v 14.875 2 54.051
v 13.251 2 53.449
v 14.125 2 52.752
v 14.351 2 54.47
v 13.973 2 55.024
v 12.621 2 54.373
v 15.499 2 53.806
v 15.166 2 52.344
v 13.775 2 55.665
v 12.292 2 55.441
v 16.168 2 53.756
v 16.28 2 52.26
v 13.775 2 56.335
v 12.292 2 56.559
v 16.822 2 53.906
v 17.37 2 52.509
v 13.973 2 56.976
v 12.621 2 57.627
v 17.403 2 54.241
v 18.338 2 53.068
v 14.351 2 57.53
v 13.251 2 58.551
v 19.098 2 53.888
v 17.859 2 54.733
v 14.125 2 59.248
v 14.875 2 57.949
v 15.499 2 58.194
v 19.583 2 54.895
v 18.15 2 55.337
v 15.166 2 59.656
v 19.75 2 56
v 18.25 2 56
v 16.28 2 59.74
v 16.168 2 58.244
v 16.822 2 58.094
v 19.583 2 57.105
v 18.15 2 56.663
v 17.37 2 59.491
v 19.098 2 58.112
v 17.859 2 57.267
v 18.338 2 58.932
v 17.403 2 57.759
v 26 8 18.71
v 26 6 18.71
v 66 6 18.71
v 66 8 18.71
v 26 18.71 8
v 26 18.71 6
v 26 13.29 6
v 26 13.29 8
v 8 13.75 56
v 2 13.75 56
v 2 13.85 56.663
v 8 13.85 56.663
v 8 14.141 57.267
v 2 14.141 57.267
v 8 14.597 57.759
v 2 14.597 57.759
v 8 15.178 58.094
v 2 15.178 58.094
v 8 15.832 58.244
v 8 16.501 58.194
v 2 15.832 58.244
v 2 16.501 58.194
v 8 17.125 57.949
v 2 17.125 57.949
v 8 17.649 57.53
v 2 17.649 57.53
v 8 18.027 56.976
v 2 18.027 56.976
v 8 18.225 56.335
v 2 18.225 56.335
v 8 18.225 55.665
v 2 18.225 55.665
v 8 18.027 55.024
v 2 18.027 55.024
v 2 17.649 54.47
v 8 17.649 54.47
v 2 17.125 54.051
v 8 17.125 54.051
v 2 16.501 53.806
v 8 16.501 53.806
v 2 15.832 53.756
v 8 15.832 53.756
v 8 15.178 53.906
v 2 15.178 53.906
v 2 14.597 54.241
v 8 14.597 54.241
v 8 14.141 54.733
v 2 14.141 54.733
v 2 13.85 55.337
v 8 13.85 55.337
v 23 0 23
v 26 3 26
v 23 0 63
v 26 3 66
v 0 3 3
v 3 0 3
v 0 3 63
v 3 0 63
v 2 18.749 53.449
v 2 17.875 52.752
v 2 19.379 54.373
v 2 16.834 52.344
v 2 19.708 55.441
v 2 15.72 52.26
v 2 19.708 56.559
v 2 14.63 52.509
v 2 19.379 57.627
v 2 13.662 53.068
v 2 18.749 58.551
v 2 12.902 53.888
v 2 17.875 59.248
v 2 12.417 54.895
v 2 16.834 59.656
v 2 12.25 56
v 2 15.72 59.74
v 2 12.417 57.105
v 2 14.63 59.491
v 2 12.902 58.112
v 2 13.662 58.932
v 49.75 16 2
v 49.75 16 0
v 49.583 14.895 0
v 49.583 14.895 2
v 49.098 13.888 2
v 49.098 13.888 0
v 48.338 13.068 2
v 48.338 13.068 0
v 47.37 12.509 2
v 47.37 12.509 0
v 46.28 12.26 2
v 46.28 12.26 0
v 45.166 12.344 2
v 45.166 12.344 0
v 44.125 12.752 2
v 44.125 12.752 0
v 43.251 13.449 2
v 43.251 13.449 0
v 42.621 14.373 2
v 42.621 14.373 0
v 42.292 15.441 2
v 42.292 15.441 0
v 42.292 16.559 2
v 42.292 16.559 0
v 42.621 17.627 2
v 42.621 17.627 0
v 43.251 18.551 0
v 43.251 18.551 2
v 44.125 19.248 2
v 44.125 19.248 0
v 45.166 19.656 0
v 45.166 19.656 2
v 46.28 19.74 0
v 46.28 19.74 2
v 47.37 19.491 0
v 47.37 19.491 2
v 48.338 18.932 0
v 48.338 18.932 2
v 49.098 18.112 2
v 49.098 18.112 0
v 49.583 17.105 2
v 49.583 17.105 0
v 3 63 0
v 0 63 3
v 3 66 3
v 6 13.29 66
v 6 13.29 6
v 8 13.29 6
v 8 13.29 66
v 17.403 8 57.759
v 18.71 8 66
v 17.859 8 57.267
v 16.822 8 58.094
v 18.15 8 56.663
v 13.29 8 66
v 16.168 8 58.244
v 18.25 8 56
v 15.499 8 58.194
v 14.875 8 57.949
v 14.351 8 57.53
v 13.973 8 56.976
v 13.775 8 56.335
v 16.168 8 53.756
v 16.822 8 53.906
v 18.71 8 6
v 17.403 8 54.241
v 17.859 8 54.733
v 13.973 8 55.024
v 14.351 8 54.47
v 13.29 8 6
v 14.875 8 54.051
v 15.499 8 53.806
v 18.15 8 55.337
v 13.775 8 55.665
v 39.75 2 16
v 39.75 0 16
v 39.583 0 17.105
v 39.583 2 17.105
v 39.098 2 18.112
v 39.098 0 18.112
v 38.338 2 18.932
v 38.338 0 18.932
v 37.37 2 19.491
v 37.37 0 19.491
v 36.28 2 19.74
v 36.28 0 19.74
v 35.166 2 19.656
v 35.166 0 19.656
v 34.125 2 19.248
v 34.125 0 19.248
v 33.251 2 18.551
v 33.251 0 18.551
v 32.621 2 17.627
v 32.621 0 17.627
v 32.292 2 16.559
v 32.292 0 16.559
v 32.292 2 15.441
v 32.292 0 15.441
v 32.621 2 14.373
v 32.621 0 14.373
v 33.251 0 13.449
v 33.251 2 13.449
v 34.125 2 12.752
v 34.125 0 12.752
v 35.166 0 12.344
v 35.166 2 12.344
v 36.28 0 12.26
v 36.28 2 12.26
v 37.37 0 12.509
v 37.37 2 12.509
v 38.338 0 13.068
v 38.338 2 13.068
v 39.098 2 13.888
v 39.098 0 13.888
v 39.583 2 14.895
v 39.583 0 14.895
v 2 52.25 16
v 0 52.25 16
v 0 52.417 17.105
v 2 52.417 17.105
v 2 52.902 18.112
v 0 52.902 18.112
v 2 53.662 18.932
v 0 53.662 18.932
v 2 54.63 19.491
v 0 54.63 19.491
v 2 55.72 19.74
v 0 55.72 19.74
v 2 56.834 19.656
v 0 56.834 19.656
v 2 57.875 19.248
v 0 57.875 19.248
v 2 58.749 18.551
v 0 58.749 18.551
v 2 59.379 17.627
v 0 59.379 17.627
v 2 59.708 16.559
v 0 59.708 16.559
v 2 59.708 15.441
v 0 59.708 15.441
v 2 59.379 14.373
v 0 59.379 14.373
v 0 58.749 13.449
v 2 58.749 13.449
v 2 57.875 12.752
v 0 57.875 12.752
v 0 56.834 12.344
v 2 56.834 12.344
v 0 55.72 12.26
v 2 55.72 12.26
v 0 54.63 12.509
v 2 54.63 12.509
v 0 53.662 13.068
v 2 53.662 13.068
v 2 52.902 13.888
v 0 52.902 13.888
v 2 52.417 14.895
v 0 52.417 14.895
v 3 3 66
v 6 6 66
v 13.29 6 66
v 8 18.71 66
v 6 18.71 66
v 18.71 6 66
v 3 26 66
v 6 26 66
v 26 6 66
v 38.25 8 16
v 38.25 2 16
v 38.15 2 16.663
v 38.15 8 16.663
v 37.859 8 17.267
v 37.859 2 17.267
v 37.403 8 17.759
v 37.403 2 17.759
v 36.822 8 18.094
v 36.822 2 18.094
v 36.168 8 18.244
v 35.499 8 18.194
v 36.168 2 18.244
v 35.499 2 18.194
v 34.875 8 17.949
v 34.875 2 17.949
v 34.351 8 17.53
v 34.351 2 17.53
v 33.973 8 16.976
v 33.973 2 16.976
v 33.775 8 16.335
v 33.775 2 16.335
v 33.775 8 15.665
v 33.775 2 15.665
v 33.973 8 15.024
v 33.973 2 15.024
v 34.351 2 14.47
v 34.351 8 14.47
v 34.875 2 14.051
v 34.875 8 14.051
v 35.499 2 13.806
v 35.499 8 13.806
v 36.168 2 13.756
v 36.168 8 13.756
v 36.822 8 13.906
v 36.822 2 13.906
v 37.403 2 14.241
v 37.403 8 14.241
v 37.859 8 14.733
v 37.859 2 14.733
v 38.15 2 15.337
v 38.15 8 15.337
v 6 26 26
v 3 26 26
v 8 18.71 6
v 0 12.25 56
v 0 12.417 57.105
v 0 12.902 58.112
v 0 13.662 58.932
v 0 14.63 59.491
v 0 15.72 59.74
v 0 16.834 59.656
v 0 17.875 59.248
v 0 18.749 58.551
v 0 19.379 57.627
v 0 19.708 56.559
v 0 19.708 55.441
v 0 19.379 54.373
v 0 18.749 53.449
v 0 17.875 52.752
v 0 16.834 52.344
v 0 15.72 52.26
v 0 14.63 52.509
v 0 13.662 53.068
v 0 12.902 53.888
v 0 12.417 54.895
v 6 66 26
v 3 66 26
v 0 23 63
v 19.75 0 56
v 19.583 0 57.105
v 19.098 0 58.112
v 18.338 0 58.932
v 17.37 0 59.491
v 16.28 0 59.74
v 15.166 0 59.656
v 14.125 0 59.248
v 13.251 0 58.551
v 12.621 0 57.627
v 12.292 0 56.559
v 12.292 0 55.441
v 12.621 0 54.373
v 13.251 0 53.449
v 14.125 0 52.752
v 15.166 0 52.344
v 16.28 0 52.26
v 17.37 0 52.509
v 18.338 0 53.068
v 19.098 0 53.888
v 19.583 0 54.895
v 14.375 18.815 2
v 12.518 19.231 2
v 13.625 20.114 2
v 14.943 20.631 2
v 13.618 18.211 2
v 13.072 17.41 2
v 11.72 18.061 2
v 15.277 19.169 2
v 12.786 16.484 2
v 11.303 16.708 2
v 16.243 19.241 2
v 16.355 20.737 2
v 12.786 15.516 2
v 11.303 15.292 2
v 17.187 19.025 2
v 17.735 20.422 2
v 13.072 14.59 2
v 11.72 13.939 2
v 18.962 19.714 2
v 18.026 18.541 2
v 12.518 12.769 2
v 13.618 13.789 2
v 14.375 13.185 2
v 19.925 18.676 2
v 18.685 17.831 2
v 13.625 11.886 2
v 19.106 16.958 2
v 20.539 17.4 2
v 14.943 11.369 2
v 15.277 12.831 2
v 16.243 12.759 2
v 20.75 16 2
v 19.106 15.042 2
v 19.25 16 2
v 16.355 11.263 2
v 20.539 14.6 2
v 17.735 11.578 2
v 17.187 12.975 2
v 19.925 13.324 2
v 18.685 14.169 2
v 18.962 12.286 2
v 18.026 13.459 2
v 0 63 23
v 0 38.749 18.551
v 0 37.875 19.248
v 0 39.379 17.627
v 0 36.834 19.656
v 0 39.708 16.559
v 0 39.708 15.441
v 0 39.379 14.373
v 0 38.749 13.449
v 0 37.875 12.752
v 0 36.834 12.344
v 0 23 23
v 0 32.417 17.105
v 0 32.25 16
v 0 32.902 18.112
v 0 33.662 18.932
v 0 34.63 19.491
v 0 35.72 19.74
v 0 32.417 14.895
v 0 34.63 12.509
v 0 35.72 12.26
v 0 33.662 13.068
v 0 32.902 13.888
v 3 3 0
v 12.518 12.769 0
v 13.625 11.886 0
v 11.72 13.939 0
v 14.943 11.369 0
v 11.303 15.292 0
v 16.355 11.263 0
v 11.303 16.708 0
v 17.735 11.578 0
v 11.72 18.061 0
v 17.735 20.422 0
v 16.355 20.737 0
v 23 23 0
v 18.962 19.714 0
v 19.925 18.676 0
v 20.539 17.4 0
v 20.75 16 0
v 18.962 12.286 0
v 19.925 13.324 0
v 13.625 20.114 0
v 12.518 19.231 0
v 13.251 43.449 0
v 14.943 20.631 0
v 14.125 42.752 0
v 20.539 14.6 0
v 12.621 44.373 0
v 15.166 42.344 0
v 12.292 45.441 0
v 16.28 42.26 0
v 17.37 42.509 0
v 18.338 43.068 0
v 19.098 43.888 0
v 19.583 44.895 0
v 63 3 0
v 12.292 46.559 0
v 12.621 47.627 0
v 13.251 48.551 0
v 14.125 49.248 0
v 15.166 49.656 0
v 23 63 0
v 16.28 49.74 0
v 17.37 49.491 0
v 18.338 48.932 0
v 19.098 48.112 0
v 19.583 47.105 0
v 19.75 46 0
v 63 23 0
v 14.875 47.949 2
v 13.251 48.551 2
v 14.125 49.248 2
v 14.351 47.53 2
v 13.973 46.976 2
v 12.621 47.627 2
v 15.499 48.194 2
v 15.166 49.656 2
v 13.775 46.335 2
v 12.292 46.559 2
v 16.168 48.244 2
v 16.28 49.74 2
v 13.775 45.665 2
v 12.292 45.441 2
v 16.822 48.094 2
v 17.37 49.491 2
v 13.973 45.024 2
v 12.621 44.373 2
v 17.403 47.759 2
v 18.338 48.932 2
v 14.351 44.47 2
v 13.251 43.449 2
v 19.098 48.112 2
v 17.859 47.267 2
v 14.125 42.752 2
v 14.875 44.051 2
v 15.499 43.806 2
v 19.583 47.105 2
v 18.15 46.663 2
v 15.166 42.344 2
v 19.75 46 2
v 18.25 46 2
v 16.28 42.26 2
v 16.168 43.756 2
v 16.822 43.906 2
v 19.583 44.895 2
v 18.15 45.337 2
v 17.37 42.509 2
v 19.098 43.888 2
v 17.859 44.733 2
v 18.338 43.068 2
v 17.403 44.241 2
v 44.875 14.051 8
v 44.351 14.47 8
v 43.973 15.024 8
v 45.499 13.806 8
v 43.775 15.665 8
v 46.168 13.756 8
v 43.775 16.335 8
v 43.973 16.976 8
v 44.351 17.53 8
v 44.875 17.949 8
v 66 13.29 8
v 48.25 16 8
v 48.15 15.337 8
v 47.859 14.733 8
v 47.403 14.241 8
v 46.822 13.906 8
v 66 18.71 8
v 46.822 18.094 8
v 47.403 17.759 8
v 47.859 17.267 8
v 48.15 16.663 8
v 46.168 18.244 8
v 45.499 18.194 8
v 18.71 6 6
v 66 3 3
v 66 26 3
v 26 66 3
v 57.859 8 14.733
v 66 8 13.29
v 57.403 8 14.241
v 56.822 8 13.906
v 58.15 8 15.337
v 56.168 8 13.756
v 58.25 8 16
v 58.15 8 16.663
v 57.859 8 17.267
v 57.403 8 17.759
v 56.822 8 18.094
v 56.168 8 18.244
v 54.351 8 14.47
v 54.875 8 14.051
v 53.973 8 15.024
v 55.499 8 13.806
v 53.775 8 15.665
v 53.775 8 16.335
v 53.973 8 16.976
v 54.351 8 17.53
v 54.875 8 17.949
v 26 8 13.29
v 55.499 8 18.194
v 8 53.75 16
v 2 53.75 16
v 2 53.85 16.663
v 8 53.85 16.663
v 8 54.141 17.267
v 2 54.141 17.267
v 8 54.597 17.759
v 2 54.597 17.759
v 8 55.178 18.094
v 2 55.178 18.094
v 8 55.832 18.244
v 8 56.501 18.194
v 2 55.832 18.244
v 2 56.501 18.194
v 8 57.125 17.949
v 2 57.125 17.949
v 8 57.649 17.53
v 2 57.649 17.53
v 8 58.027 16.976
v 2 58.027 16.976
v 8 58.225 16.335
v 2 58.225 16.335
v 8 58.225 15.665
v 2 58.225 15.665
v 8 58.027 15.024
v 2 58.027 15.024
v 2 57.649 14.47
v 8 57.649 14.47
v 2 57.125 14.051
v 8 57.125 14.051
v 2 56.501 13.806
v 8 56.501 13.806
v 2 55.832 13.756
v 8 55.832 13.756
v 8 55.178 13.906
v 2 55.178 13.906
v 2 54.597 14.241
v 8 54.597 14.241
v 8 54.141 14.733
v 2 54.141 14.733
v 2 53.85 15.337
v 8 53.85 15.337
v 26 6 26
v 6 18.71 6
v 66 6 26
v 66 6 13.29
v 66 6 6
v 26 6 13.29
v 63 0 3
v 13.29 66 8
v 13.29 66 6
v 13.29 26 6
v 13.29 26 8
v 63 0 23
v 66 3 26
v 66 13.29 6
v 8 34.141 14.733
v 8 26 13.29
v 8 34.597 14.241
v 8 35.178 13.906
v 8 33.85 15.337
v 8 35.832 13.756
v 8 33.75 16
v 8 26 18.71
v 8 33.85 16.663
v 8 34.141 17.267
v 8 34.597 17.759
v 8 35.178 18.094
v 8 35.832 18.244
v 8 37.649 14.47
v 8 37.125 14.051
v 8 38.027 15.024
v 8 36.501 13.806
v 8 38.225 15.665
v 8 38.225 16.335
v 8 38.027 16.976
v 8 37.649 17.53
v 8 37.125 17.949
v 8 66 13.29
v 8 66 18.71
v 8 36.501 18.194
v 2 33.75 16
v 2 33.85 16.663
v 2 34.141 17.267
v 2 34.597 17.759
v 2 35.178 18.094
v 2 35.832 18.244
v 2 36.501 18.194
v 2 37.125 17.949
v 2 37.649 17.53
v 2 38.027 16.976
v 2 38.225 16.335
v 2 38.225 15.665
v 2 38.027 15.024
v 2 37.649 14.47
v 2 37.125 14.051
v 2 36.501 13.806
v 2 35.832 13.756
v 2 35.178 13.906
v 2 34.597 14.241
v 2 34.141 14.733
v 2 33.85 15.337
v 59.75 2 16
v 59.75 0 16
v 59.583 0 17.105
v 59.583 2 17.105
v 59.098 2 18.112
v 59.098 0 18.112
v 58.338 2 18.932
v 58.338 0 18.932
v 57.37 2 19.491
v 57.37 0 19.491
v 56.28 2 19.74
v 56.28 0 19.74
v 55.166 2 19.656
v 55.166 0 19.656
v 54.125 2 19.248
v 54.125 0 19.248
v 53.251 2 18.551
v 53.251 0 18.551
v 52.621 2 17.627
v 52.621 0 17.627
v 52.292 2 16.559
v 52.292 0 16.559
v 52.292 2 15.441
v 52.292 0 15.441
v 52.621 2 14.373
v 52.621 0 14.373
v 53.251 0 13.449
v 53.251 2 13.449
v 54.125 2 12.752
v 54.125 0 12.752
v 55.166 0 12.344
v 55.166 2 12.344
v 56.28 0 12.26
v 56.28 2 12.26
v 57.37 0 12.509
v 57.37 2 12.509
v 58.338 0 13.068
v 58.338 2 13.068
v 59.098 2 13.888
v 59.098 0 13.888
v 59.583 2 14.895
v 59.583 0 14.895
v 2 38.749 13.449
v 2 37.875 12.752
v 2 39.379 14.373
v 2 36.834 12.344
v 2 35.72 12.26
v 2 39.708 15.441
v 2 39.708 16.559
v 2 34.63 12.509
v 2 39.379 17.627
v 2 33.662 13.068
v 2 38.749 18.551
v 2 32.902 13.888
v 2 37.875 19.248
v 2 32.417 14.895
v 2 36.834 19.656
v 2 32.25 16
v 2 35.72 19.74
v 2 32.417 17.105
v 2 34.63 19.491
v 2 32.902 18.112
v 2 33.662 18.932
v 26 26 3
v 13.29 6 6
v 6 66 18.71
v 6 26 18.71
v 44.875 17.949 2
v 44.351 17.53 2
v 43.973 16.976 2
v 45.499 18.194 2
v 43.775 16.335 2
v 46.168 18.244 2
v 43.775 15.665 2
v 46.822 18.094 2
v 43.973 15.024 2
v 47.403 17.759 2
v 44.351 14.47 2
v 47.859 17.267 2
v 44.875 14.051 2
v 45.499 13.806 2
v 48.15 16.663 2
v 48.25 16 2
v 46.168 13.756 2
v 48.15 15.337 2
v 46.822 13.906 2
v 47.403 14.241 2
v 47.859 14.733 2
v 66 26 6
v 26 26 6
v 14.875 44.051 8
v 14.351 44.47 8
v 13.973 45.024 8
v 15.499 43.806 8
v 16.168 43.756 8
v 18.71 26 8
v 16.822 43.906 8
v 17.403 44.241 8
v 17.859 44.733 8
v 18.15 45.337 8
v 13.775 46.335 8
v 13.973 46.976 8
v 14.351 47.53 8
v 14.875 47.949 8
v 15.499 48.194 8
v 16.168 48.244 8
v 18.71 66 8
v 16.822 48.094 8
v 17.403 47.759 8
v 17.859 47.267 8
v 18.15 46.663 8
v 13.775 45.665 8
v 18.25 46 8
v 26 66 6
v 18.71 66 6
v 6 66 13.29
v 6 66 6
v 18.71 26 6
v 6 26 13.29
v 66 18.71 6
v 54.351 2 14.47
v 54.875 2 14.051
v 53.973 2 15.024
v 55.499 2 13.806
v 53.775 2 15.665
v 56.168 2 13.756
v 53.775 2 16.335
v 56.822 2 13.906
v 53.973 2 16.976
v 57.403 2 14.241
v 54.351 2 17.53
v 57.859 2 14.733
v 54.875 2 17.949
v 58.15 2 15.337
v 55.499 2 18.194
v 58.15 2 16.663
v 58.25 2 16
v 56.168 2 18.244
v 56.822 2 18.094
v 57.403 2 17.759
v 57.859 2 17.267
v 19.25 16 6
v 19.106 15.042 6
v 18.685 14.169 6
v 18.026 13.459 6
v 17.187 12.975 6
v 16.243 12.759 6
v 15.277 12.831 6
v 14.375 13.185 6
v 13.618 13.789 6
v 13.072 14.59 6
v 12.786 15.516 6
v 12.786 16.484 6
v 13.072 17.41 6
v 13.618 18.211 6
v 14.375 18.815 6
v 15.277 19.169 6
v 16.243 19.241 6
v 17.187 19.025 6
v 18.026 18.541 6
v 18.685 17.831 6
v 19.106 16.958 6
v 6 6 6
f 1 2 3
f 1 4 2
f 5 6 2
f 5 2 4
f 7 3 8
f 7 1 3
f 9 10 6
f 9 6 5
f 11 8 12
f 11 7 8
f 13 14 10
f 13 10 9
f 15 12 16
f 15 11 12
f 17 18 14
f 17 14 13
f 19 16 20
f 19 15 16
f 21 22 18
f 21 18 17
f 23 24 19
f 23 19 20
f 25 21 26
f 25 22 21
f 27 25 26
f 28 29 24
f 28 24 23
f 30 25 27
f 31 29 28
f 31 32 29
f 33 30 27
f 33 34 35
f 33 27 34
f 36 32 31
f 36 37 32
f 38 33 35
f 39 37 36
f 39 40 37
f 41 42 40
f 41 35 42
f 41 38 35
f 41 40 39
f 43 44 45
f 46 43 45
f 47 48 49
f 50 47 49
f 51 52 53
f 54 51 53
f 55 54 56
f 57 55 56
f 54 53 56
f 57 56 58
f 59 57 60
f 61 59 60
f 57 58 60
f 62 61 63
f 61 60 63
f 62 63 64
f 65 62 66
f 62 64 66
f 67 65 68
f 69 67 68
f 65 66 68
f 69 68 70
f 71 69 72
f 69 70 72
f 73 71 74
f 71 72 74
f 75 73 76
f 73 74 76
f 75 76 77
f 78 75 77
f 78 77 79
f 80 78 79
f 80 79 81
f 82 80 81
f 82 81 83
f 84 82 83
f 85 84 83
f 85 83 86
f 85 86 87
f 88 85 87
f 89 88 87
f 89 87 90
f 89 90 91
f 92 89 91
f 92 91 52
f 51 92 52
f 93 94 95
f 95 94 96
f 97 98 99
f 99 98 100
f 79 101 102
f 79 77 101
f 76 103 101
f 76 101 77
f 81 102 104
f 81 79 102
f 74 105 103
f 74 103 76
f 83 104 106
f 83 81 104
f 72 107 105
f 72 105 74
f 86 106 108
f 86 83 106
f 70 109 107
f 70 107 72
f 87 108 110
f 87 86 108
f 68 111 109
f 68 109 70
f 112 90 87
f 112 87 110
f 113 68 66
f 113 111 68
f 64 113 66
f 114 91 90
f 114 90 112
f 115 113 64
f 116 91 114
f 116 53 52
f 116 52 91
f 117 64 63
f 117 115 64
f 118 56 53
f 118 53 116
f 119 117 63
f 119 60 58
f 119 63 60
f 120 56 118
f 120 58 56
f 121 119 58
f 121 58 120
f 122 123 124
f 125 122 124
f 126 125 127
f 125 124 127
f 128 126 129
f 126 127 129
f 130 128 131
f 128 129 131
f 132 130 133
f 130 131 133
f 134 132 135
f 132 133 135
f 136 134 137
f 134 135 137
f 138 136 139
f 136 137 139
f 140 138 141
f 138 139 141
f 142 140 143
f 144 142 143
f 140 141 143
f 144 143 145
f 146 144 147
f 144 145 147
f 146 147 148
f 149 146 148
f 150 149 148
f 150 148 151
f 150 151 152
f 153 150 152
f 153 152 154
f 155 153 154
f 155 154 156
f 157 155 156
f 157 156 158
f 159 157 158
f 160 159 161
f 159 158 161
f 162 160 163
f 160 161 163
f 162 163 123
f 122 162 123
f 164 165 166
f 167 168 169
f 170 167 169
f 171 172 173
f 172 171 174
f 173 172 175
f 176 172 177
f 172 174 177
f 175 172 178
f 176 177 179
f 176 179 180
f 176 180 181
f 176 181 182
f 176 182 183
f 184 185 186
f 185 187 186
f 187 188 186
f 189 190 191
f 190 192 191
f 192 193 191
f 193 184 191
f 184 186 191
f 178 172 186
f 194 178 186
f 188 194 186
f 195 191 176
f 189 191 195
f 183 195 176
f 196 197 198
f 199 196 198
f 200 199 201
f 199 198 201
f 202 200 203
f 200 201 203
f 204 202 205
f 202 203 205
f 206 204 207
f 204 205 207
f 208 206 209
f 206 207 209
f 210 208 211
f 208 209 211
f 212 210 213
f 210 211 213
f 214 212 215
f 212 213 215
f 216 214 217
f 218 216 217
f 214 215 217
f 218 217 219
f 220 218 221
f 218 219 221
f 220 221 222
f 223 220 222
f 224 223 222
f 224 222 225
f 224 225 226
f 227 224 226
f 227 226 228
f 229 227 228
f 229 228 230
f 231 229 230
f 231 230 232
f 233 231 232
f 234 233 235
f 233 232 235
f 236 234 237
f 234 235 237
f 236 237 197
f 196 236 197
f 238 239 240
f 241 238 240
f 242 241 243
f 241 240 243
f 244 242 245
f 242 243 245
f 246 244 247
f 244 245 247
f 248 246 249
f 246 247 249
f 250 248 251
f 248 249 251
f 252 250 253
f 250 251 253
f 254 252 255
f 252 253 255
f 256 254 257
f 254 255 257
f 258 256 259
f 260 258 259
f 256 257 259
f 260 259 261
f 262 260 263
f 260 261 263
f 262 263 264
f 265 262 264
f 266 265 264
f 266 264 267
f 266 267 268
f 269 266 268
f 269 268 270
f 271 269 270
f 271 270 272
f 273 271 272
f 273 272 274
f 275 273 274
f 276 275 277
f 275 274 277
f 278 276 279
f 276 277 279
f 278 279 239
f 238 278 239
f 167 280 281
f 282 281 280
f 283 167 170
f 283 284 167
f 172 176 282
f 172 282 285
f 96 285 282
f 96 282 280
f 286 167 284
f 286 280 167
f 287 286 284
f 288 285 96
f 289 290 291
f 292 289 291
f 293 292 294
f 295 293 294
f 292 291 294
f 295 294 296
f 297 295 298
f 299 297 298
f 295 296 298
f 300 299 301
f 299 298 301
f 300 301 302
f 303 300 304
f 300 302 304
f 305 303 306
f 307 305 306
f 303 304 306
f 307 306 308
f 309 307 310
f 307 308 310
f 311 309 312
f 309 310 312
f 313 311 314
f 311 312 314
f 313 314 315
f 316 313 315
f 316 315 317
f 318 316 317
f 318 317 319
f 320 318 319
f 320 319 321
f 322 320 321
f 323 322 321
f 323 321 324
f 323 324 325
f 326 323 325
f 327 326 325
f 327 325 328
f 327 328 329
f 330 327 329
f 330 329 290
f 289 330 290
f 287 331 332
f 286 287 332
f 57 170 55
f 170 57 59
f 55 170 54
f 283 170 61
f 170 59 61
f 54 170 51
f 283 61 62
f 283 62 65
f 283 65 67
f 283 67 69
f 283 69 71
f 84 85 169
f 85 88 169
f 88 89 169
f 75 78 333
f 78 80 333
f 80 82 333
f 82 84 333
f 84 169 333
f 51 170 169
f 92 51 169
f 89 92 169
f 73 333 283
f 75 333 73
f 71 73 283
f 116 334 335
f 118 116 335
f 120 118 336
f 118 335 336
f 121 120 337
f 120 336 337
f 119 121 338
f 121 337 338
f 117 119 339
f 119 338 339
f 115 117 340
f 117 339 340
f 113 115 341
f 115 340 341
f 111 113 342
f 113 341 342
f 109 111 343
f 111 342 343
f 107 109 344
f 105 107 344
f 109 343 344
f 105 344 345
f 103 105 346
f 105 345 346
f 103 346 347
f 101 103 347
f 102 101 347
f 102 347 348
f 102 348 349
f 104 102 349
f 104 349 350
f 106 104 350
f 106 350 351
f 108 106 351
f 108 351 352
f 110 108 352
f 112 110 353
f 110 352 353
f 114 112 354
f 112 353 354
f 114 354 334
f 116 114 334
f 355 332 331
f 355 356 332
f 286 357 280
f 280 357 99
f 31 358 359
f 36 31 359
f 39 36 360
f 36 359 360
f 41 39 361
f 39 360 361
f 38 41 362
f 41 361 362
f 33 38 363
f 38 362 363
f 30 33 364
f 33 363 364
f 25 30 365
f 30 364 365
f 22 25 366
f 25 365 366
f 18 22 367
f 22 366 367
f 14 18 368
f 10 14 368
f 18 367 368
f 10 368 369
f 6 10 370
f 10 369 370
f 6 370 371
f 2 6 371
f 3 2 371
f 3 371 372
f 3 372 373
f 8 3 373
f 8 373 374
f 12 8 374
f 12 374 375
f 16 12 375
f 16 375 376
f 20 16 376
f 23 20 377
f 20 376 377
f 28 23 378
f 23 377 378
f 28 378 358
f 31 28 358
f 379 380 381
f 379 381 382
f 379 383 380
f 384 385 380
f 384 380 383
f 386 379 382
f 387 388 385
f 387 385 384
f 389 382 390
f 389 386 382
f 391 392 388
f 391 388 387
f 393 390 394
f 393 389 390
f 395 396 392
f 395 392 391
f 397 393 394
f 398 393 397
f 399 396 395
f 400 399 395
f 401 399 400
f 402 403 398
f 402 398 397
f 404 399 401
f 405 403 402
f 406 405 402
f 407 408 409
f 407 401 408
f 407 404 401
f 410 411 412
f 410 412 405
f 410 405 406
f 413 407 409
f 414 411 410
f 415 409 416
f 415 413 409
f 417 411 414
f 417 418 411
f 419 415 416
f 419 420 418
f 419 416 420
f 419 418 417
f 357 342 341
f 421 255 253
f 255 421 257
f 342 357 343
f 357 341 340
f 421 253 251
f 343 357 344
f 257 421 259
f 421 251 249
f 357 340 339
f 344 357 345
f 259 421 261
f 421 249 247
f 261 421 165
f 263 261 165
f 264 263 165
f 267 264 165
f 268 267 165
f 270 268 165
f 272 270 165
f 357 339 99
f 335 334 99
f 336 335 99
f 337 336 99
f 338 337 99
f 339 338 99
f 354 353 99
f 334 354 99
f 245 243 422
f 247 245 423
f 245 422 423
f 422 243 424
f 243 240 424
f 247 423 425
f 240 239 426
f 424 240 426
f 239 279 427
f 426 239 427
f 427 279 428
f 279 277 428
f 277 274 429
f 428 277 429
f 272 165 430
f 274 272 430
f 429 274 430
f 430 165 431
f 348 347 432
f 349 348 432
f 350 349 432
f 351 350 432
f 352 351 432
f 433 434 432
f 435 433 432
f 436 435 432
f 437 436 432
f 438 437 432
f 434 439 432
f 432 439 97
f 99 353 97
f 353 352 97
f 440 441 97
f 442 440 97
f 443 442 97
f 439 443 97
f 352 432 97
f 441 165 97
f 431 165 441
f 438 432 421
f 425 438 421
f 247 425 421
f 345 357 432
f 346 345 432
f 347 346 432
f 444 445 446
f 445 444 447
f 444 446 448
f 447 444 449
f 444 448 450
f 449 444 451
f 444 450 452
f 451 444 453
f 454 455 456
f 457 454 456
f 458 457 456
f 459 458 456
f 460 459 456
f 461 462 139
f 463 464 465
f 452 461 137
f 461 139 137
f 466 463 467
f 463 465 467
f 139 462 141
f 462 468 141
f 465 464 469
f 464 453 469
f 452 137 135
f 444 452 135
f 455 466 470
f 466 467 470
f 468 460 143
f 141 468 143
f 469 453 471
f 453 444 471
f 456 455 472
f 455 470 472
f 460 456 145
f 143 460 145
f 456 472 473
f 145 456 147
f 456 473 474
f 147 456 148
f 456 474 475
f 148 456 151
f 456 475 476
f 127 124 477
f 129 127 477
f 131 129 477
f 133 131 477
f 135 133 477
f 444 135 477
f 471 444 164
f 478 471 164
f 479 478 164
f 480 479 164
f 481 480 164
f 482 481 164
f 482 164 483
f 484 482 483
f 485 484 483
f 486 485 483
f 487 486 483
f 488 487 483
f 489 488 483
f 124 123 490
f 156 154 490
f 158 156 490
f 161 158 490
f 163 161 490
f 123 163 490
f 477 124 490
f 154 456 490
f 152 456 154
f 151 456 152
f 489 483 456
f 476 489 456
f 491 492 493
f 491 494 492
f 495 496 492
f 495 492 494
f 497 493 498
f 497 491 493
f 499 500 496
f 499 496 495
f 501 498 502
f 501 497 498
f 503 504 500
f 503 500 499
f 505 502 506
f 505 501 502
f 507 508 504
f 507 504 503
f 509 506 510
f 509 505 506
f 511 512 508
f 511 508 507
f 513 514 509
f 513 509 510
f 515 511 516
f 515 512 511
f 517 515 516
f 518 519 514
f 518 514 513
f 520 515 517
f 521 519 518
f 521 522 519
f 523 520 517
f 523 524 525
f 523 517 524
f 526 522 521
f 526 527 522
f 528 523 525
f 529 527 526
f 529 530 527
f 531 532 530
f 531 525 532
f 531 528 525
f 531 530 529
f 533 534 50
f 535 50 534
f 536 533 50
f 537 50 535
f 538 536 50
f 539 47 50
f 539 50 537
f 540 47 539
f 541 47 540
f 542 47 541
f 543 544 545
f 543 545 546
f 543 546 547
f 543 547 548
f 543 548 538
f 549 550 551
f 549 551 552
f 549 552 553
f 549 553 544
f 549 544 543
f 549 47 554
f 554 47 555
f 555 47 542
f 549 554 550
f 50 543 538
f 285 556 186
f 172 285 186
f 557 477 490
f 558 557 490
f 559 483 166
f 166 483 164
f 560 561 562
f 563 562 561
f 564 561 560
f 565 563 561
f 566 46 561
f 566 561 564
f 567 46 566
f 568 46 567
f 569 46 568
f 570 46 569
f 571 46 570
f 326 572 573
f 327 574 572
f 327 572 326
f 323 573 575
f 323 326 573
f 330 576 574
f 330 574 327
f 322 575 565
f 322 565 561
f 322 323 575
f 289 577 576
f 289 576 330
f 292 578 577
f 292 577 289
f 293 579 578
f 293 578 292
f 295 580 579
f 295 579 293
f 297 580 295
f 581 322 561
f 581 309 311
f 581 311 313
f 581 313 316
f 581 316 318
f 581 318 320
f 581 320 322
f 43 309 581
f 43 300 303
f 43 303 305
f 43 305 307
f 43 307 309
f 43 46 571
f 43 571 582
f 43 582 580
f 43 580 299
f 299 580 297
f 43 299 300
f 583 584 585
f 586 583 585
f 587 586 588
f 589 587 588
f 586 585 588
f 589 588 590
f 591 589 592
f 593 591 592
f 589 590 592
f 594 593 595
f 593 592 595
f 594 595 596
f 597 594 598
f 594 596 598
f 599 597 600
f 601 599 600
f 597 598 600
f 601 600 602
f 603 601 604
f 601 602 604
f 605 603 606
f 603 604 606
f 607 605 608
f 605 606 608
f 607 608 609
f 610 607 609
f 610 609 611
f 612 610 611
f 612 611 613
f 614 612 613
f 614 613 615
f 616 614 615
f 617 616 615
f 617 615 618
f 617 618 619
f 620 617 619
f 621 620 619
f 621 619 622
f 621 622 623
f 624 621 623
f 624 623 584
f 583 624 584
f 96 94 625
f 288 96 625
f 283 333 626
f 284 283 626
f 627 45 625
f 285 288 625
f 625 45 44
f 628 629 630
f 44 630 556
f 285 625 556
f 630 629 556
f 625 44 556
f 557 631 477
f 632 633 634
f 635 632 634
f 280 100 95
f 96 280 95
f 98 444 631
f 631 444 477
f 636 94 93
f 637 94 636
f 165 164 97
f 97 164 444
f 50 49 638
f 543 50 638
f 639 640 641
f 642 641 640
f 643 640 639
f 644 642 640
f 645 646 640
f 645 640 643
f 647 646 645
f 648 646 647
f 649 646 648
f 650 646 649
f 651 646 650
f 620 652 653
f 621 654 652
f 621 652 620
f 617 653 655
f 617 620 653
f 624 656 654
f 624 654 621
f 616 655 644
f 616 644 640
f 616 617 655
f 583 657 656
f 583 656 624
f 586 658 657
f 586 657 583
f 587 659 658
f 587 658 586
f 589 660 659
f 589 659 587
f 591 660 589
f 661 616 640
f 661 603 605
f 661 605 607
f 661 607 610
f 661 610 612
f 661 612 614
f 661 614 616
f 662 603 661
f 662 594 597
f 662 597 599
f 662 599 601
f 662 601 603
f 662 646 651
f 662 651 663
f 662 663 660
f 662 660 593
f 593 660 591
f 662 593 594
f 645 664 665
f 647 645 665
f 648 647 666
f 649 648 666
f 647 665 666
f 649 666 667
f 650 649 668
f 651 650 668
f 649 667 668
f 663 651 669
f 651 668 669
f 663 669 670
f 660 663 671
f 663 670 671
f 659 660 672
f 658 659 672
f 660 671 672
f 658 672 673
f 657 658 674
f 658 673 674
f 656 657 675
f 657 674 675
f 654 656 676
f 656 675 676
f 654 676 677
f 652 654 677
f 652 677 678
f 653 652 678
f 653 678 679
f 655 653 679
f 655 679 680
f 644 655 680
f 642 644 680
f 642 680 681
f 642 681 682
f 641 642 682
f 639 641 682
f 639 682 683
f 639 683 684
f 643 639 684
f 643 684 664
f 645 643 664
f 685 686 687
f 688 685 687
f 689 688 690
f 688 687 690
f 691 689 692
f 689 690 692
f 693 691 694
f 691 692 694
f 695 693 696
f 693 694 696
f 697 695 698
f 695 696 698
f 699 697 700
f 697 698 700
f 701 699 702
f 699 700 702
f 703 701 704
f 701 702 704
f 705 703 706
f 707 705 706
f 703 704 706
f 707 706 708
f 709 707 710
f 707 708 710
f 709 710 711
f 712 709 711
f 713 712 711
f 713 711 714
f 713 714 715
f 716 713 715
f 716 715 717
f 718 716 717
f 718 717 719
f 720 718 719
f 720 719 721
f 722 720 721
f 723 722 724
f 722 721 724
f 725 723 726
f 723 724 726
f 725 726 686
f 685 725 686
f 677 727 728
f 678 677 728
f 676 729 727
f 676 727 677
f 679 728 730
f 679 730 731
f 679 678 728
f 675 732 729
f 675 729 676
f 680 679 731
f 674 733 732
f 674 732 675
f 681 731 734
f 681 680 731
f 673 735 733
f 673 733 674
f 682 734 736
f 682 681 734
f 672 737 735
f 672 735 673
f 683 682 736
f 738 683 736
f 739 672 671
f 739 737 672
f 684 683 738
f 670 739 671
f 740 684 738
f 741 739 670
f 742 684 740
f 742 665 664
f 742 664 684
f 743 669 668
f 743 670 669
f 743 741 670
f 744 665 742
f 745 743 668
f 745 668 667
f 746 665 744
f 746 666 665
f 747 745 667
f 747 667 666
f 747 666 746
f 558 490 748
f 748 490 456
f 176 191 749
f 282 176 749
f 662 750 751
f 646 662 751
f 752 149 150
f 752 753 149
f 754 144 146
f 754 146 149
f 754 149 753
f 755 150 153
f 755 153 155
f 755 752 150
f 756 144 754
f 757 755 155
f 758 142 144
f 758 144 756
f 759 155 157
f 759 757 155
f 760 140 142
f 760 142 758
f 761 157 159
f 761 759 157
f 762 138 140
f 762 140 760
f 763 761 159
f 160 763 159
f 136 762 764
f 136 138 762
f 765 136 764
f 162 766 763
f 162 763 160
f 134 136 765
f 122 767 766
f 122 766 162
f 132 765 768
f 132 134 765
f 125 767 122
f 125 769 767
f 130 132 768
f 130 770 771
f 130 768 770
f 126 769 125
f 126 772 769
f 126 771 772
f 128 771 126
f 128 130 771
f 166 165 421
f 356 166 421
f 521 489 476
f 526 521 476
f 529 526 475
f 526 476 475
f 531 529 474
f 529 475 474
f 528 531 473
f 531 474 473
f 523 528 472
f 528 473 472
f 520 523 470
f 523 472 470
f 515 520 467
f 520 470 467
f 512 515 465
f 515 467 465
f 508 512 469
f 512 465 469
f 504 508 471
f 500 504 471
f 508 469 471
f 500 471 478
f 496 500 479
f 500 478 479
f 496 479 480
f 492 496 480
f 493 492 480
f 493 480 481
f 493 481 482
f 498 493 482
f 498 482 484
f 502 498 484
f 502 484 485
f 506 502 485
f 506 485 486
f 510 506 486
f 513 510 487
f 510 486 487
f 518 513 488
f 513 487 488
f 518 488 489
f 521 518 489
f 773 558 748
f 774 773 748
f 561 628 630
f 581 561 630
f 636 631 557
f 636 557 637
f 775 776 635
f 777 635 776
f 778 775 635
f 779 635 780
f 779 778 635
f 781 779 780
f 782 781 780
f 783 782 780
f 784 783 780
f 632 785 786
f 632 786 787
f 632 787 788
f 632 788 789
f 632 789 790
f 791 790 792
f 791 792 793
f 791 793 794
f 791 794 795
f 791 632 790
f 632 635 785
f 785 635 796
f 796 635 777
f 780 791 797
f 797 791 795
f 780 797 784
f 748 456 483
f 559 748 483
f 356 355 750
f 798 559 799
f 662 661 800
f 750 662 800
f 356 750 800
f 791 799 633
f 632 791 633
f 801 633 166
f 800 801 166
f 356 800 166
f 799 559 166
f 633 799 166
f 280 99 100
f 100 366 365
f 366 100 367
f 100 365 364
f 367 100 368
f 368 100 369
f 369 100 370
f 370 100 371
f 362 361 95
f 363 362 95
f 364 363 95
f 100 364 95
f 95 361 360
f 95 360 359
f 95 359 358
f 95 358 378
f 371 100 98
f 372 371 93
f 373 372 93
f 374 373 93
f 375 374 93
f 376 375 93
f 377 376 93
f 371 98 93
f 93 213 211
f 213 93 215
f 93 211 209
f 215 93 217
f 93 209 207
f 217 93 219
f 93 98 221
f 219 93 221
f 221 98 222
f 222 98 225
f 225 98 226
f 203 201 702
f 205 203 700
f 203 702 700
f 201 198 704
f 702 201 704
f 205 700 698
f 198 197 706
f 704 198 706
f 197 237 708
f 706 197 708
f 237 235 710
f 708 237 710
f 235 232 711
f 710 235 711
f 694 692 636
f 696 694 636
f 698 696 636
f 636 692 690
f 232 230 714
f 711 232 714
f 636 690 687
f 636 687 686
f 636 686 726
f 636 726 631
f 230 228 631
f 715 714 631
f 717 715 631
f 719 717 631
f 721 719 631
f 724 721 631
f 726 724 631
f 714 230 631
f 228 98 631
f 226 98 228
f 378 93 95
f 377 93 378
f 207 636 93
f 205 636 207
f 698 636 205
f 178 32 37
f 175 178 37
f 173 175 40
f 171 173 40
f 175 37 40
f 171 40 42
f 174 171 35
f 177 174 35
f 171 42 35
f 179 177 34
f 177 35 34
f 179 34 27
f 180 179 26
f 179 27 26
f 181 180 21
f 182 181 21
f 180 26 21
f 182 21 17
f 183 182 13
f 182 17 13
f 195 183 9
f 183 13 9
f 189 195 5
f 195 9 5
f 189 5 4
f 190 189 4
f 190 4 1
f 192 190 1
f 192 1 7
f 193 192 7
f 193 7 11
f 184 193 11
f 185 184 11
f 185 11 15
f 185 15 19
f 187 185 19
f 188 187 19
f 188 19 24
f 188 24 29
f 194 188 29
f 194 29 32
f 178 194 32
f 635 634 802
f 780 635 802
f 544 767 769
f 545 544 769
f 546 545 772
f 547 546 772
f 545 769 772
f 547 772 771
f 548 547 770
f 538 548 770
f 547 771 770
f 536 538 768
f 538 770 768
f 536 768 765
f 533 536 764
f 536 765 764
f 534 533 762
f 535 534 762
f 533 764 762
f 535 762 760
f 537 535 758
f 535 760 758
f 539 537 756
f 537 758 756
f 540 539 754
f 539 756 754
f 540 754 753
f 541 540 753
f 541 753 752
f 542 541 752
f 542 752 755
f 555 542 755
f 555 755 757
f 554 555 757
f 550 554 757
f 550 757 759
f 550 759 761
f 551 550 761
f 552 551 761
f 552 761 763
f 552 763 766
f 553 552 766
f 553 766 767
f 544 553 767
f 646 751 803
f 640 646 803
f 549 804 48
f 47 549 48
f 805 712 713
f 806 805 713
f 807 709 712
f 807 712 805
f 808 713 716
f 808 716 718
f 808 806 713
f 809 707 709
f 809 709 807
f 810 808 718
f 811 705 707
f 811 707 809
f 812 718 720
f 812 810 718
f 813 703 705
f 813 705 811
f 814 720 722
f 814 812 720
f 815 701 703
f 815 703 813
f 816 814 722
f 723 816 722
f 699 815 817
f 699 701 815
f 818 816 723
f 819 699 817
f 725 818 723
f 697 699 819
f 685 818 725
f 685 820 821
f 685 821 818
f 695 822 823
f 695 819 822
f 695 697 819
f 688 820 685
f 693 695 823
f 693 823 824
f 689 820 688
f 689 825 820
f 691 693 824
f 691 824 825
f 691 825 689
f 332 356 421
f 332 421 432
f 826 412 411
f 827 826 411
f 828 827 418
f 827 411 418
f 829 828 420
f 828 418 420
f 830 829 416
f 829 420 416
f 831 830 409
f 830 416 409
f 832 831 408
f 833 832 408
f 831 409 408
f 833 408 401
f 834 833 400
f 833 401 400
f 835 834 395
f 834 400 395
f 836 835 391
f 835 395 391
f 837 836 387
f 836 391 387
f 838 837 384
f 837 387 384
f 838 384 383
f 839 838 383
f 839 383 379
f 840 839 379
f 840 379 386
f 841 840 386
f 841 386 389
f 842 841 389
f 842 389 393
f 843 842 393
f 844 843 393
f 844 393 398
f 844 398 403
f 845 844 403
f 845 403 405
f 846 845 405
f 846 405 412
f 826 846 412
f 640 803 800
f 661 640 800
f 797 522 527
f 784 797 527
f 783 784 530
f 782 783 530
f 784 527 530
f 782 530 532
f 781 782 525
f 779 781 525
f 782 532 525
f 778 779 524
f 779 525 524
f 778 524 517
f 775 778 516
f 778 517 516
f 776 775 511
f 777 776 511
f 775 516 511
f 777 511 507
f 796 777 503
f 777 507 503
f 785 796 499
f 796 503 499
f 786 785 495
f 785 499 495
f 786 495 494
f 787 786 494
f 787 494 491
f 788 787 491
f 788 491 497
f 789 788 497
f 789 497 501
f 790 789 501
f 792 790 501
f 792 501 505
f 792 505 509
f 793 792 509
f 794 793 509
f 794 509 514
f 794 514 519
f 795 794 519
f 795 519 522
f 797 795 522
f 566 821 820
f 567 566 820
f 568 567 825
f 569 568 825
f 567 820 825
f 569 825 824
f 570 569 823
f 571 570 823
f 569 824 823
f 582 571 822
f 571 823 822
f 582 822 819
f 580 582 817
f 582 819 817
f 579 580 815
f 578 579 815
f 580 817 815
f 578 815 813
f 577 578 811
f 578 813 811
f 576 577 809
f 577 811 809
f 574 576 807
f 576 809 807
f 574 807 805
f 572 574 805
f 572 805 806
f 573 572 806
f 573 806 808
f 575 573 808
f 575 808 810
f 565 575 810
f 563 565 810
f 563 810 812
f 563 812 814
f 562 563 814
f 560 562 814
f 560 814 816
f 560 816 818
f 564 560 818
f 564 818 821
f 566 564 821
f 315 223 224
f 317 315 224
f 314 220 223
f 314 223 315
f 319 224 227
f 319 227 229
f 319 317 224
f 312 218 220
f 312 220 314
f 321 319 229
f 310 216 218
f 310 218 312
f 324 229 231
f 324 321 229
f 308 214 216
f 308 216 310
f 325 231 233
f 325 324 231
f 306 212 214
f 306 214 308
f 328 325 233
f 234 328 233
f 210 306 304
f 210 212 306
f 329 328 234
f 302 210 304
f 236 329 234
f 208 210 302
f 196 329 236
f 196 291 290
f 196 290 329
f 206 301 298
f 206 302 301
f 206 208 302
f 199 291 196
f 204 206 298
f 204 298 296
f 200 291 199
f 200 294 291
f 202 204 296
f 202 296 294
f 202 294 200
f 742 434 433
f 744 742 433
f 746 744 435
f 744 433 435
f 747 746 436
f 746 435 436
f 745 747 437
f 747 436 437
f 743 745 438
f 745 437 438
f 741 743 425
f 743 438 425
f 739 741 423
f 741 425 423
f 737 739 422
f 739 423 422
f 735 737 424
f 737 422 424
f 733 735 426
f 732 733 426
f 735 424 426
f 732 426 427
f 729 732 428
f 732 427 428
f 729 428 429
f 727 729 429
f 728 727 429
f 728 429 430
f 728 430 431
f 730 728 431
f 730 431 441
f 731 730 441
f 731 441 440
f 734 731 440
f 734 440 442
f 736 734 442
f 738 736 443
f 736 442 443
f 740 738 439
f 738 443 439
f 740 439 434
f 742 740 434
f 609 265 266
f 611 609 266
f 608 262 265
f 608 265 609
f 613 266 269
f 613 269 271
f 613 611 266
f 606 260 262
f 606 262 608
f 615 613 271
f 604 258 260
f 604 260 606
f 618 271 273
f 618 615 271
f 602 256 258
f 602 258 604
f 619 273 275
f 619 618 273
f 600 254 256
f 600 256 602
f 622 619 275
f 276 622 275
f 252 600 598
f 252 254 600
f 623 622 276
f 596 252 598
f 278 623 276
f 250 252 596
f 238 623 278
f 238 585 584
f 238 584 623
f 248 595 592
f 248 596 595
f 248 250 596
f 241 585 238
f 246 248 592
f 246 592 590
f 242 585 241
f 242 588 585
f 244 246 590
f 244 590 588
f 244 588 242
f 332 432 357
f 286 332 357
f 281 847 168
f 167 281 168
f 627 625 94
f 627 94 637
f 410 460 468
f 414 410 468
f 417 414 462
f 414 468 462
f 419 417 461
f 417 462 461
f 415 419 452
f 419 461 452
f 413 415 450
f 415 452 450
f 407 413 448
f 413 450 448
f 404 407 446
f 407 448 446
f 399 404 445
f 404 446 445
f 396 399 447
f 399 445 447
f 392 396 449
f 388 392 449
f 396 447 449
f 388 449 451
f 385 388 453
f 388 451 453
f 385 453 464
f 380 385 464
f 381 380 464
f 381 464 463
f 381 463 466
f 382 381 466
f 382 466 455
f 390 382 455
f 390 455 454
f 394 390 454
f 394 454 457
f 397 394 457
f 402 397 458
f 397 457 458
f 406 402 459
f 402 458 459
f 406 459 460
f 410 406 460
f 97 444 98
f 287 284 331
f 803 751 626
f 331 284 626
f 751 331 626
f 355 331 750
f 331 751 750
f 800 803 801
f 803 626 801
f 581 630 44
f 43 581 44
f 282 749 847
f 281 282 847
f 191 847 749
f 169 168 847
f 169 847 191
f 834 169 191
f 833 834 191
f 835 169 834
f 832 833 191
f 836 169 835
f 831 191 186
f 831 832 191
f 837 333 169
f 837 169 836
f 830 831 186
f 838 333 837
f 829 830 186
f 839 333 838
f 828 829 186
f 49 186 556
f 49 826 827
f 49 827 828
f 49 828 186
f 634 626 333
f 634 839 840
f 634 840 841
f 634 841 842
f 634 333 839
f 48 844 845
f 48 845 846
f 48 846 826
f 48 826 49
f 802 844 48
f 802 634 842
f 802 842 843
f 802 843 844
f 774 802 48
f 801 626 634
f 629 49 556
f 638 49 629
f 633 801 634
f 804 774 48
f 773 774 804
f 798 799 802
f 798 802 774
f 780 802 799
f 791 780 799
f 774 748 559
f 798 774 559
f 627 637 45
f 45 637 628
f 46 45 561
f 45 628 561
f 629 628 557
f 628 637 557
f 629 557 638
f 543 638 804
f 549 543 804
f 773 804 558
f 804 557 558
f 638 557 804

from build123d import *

# Parameters (mm, degrees)
F1_DEPTH  = 6
F3_DEPTH  = 20
F5_DEPTH  = 40
F7_DEPTH  = 60
F9_DEPTH  = 2
F11_DEPTH = 2
F13_DEPTH = 2
F14_R     = 2.25
F15_DEPTH = 8
F16_R     = 2.25
F17_DEPTH = 8
F18_R     = 3.25
F18_R_2   = 2.25
F19_DEPTH = 8.001
F20_R     = 3.75
F21_DEPTH = 2
F22_R     = 3.75
F23_DEPTH = 2
F24_R     = 3.75
F24_R_2   = 4.75
F25_DEPTH = 2
F26_SIZE  = 3


with BuildPart() as f1:
    # F0 (on Top) → F1 (new body)
    with BuildSketch(Plane.XY):
        Polygon((0, 66), (0, 0), (66, 0), (66, 26), (26, 26), (26, 66), align=None)
    extrude(amount=F1_DEPTH)

    # F2 (on face) → F3 (join)
    with BuildSketch(Plane.XY.offset(6)):
        Polygon((6, 66), (0, 66), (0, 0), (66, 0), (66, 6), (6, 6), align=None)
    extrude(amount=F3_DEPTH)

    # F4 (on face) → F5 (join)
    with BuildSketch(Plane.XY.offset(26)):
        Polygon((6, 6), (6, 26), (0, 26), (0, 0), (26, 0), (26, 6), align=None)
    extrude(amount=F5_DEPTH)

    # F6 (on face) → F7 (join)
    with BuildSketch(Plane.XY.offset(6)):
        Polygon((13.29, 6), (16, 6), (18.71, 6), (18.71, 8), (13.29, 8), align=None)
        Polygon((6, 18.71), (6, 16), (6, 13.29), (8, 13.29), (8, 18.71), align=None)
    extrude(amount=F7_DEPTH)

    # F8 (on face) → F9 (join)
    with BuildSketch(Plane.XY.offset(6)):
        Polygon((66, 13.29), (66, 16), (66, 18.71), (26, 18.71), (26, 13.29), align=None)
        Polygon((18.71, 66), (16, 66), (13.29, 66), (13.29, 26), (18.71, 26), align=None)
    extrude(amount=F9_DEPTH)

    # F10 (on face) → F11 (join)
    with BuildSketch(Plane(origin=(0, 6, 0), x_dir=(-1, 0, 0), z_dir=(0, 1, 0))):
        Polygon((-66, 18.71), (-66, 16), (-66, 13.29), (-26, 13.29), (-26, 16), (-26, 18.71), align=None)
    extrude(amount=F11_DEPTH)

    # F12 (on face) → F13 (join)
    with BuildSketch(Plane.YZ.offset(6)):
        Polygon((66, 13.29), (66, 16), (66, 18.71), (26, 18.71), (26, 13.29), align=None)
    extrude(amount=F13_DEPTH)

    # F14 (on face) → F15 (cut, through all)
    with BuildSketch(Plane.XZ):
        with Locations((56, 16)):
            Circle(F14_R)
        with Locations((16, 56)):
            Circle(F14_R)
        with Locations((36, 16)):
            Circle(F14_R)
    extrude(amount=-F15_DEPTH, mode=Mode.SUBTRACT)

    # F16 (on face) → F17 (cut, through all)
    with BuildSketch(Plane(origin=(0, 0, 0), x_dir=(0, -1, 0), z_dir=(-1, 0, 0))):
        with Locations((-16, 56)):
            Circle(F16_R)
        with Locations((-56, 16)):
            Circle(F16_R)
        with Locations((-36, 16)):
            Circle(F16_R)
    extrude(amount=-F17_DEPTH, mode=Mode.SUBTRACT)

    # F18 (on face) → F19 (cut, through all)
    with BuildSketch(Plane(origin=(0, 0, 0), x_dir=(1, 0, 0), z_dir=(0, 0, -1))):
        with Locations((16, -16)):
            Circle(F18_R)
        with Locations((46, -16)):
            Circle(F18_R_2)
        with Locations((16, -46)):
            Circle(F18_R_2)
    extrude(amount=-F19_DEPTH, mode=Mode.SUBTRACT)

    # F20 (on face) → F21 (cut)
    with BuildSketch(Plane.XZ):
        with Locations((16, 56)):
            Circle(F20_R)
        with Locations((36, 16)):
            Circle(F20_R)
        with Locations((56, 16)):
            Circle(F20_R)
    extrude(amount=-F21_DEPTH, mode=Mode.SUBTRACT)

    # F22 (on face) → F23 (cut)
    with BuildSketch(Plane(origin=(0, 0, 0), x_dir=(0, -1, 0), z_dir=(-1, 0, 0))):
        with Locations((-16, 56)):
            Circle(F22_R)
        with Locations((-36, 16)):
            Circle(F22_R)
        with Locations((-56, 16)):
            Circle(F22_R)
    extrude(amount=-F23_DEPTH, mode=Mode.SUBTRACT)

    # F24 (on face) → F25 (cut)
    with BuildSketch(Plane(origin=(0, 0, 0), x_dir=(1, 0, 0), z_dir=(0, 0, -1))):
        with Locations((16, -46)):
            Circle(F24_R)
        with Locations((16, -16)):
            Circle(F24_R_2)
        with Locations((46, -16)):
            Circle(F24_R)
    extrude(amount=-F25_DEPTH, mode=Mode.SUBTRACT)

    # F26
    f26_edges = [f1.edges().sort_by_distance(p)[0] for p in [
        (33, 0, 0),
        (0, 33, 0),
        (0, 0, 33),
        (0, 26, 46),
        (0, 46, 26),
        (26, 0, 46),
        (46, 0, 26),
        (0, 13, 66),
        (13, 0, 66),
        (0, 66, 13),
        (13, 66, 0),
        (66, 0, 13),
        (66, 13, 0),
        (46, 26, 0),
        (26, 46, 0),
    ]]
    chamfer(f26_edges, length=F26_SIZE)


solid = f1.part
